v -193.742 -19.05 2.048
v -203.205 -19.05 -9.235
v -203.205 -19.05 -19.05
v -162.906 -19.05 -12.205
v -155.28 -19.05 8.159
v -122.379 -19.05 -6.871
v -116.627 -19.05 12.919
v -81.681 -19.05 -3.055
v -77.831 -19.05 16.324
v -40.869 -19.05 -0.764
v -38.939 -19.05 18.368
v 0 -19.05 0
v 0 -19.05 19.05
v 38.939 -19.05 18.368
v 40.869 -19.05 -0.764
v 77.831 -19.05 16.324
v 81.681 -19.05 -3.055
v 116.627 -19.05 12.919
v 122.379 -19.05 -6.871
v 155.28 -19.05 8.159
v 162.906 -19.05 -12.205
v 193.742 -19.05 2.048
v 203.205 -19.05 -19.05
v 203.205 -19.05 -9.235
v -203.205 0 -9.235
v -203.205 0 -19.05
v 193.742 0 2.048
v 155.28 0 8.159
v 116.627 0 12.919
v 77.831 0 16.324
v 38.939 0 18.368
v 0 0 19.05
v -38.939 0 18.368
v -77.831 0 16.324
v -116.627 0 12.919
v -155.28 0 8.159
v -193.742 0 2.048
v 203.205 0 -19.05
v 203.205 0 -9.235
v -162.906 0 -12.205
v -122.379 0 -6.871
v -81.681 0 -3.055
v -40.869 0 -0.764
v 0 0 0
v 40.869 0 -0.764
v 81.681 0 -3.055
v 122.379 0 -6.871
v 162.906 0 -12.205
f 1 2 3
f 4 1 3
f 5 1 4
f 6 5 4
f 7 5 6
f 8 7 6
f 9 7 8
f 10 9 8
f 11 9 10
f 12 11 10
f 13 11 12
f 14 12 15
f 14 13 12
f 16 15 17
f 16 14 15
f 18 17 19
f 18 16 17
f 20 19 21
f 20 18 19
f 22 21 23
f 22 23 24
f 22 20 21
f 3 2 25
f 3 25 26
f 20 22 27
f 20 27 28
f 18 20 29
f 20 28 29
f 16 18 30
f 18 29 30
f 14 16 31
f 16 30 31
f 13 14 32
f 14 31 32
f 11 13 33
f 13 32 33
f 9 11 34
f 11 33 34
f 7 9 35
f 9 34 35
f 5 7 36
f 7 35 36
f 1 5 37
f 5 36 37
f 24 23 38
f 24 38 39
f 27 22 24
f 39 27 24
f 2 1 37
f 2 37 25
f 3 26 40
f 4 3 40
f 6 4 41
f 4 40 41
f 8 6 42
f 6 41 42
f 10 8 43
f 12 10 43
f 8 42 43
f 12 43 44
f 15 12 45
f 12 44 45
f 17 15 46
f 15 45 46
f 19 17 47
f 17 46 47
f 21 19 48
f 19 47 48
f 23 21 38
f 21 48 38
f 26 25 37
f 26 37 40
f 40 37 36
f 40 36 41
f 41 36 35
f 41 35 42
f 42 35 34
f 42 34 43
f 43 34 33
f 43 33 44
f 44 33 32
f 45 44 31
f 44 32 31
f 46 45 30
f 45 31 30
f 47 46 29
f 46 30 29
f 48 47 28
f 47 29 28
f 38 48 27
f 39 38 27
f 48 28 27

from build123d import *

# Parameters (mm, degrees)
F1_DEPTH    = 19.05
F2_T1_DEPTH = 68.6123794065


# Not quite as in the source:
# - a fillet or chamfer that OpenCascade refuses, or shapes differently, is made with other operations: its cross-section is extruded or revolved along the edge and cut away or added


with BuildPart() as f1:
    # F0 (on Front) → F1 (new body)
    with BuildSketch(Plane.XZ):
        with BuildLine():
            ThreePointArc((-203.2046722501, -19.05), (0, 0), (203.2046722501, -19.05))
            Line((203.2046722501, -19.05), (203.2046722501, 0.3318805247))
            ThreePointArc((203.2046722501, 0.3318805247), (0, 19.0500002354), (-203.2046722501, 0.3318805247))
            Line((-203.2046722501, 0.3318805247), (-203.2046722501, -19.05))
        make_face()
    extrude(amount=F1_DEPTH)

    # F2: chamfer of 9.525 on 2 edges, made by hand

    # F2_s2 → F2_t1 (cut)
    with BuildSketch(Plane.XZ.offset(-24.7811897032)):
        with BuildLine():
            Line((-193.4976640556, 2.339657905), (-203.4494965837, -9.5268916064))
            Line((-203.4494965837, -9.5268916064), (-203.6399965837, -9.5268916064))
            ThreePointArc((-203.6399965837, -9.5268916064), (-203.3951722501, -4.5975055408), (-203.3951722501, 0.3318805247))
            Line((-203.3951722501, 0.3318805247), (-203.2394726328, 0.5191749009))
            ThreePointArc((-203.2394726328, 0.5191749009), (-198.3652719444, 1.4136040473), (-193.5308439656, 2.5272461338))
            Line((-193.5308439656, 2.5272461338), (-193.4976640556, 2.339657905))
        make_face()
        with BuildLine():
            Line((193.4976640556, 2.339657905), (203.4494965837, -9.5268916064))
            Line((203.4494965837, -9.5268916064), (203.6399965837, -9.5268916064))
            ThreePointArc((203.6399965837, -9.5268916064), (203.3951722501, -4.5975055408), (203.3951722501, 0.3318805247))
            Line((203.3951722501, 0.3318805247), (203.2394726328, 0.5191749009))
            ThreePointArc((203.2394726328, 0.5191749009), (198.3652719444, 1.4136040473), (193.5308439656, 2.5272461338))
            Line((193.5308439656, 2.5272461338), (193.4976640556, 2.339657905))
        make_face()
    extrude(amount=F2_T1_DEPTH, mode=Mode.SUBTRACT)


solid = f1.part
